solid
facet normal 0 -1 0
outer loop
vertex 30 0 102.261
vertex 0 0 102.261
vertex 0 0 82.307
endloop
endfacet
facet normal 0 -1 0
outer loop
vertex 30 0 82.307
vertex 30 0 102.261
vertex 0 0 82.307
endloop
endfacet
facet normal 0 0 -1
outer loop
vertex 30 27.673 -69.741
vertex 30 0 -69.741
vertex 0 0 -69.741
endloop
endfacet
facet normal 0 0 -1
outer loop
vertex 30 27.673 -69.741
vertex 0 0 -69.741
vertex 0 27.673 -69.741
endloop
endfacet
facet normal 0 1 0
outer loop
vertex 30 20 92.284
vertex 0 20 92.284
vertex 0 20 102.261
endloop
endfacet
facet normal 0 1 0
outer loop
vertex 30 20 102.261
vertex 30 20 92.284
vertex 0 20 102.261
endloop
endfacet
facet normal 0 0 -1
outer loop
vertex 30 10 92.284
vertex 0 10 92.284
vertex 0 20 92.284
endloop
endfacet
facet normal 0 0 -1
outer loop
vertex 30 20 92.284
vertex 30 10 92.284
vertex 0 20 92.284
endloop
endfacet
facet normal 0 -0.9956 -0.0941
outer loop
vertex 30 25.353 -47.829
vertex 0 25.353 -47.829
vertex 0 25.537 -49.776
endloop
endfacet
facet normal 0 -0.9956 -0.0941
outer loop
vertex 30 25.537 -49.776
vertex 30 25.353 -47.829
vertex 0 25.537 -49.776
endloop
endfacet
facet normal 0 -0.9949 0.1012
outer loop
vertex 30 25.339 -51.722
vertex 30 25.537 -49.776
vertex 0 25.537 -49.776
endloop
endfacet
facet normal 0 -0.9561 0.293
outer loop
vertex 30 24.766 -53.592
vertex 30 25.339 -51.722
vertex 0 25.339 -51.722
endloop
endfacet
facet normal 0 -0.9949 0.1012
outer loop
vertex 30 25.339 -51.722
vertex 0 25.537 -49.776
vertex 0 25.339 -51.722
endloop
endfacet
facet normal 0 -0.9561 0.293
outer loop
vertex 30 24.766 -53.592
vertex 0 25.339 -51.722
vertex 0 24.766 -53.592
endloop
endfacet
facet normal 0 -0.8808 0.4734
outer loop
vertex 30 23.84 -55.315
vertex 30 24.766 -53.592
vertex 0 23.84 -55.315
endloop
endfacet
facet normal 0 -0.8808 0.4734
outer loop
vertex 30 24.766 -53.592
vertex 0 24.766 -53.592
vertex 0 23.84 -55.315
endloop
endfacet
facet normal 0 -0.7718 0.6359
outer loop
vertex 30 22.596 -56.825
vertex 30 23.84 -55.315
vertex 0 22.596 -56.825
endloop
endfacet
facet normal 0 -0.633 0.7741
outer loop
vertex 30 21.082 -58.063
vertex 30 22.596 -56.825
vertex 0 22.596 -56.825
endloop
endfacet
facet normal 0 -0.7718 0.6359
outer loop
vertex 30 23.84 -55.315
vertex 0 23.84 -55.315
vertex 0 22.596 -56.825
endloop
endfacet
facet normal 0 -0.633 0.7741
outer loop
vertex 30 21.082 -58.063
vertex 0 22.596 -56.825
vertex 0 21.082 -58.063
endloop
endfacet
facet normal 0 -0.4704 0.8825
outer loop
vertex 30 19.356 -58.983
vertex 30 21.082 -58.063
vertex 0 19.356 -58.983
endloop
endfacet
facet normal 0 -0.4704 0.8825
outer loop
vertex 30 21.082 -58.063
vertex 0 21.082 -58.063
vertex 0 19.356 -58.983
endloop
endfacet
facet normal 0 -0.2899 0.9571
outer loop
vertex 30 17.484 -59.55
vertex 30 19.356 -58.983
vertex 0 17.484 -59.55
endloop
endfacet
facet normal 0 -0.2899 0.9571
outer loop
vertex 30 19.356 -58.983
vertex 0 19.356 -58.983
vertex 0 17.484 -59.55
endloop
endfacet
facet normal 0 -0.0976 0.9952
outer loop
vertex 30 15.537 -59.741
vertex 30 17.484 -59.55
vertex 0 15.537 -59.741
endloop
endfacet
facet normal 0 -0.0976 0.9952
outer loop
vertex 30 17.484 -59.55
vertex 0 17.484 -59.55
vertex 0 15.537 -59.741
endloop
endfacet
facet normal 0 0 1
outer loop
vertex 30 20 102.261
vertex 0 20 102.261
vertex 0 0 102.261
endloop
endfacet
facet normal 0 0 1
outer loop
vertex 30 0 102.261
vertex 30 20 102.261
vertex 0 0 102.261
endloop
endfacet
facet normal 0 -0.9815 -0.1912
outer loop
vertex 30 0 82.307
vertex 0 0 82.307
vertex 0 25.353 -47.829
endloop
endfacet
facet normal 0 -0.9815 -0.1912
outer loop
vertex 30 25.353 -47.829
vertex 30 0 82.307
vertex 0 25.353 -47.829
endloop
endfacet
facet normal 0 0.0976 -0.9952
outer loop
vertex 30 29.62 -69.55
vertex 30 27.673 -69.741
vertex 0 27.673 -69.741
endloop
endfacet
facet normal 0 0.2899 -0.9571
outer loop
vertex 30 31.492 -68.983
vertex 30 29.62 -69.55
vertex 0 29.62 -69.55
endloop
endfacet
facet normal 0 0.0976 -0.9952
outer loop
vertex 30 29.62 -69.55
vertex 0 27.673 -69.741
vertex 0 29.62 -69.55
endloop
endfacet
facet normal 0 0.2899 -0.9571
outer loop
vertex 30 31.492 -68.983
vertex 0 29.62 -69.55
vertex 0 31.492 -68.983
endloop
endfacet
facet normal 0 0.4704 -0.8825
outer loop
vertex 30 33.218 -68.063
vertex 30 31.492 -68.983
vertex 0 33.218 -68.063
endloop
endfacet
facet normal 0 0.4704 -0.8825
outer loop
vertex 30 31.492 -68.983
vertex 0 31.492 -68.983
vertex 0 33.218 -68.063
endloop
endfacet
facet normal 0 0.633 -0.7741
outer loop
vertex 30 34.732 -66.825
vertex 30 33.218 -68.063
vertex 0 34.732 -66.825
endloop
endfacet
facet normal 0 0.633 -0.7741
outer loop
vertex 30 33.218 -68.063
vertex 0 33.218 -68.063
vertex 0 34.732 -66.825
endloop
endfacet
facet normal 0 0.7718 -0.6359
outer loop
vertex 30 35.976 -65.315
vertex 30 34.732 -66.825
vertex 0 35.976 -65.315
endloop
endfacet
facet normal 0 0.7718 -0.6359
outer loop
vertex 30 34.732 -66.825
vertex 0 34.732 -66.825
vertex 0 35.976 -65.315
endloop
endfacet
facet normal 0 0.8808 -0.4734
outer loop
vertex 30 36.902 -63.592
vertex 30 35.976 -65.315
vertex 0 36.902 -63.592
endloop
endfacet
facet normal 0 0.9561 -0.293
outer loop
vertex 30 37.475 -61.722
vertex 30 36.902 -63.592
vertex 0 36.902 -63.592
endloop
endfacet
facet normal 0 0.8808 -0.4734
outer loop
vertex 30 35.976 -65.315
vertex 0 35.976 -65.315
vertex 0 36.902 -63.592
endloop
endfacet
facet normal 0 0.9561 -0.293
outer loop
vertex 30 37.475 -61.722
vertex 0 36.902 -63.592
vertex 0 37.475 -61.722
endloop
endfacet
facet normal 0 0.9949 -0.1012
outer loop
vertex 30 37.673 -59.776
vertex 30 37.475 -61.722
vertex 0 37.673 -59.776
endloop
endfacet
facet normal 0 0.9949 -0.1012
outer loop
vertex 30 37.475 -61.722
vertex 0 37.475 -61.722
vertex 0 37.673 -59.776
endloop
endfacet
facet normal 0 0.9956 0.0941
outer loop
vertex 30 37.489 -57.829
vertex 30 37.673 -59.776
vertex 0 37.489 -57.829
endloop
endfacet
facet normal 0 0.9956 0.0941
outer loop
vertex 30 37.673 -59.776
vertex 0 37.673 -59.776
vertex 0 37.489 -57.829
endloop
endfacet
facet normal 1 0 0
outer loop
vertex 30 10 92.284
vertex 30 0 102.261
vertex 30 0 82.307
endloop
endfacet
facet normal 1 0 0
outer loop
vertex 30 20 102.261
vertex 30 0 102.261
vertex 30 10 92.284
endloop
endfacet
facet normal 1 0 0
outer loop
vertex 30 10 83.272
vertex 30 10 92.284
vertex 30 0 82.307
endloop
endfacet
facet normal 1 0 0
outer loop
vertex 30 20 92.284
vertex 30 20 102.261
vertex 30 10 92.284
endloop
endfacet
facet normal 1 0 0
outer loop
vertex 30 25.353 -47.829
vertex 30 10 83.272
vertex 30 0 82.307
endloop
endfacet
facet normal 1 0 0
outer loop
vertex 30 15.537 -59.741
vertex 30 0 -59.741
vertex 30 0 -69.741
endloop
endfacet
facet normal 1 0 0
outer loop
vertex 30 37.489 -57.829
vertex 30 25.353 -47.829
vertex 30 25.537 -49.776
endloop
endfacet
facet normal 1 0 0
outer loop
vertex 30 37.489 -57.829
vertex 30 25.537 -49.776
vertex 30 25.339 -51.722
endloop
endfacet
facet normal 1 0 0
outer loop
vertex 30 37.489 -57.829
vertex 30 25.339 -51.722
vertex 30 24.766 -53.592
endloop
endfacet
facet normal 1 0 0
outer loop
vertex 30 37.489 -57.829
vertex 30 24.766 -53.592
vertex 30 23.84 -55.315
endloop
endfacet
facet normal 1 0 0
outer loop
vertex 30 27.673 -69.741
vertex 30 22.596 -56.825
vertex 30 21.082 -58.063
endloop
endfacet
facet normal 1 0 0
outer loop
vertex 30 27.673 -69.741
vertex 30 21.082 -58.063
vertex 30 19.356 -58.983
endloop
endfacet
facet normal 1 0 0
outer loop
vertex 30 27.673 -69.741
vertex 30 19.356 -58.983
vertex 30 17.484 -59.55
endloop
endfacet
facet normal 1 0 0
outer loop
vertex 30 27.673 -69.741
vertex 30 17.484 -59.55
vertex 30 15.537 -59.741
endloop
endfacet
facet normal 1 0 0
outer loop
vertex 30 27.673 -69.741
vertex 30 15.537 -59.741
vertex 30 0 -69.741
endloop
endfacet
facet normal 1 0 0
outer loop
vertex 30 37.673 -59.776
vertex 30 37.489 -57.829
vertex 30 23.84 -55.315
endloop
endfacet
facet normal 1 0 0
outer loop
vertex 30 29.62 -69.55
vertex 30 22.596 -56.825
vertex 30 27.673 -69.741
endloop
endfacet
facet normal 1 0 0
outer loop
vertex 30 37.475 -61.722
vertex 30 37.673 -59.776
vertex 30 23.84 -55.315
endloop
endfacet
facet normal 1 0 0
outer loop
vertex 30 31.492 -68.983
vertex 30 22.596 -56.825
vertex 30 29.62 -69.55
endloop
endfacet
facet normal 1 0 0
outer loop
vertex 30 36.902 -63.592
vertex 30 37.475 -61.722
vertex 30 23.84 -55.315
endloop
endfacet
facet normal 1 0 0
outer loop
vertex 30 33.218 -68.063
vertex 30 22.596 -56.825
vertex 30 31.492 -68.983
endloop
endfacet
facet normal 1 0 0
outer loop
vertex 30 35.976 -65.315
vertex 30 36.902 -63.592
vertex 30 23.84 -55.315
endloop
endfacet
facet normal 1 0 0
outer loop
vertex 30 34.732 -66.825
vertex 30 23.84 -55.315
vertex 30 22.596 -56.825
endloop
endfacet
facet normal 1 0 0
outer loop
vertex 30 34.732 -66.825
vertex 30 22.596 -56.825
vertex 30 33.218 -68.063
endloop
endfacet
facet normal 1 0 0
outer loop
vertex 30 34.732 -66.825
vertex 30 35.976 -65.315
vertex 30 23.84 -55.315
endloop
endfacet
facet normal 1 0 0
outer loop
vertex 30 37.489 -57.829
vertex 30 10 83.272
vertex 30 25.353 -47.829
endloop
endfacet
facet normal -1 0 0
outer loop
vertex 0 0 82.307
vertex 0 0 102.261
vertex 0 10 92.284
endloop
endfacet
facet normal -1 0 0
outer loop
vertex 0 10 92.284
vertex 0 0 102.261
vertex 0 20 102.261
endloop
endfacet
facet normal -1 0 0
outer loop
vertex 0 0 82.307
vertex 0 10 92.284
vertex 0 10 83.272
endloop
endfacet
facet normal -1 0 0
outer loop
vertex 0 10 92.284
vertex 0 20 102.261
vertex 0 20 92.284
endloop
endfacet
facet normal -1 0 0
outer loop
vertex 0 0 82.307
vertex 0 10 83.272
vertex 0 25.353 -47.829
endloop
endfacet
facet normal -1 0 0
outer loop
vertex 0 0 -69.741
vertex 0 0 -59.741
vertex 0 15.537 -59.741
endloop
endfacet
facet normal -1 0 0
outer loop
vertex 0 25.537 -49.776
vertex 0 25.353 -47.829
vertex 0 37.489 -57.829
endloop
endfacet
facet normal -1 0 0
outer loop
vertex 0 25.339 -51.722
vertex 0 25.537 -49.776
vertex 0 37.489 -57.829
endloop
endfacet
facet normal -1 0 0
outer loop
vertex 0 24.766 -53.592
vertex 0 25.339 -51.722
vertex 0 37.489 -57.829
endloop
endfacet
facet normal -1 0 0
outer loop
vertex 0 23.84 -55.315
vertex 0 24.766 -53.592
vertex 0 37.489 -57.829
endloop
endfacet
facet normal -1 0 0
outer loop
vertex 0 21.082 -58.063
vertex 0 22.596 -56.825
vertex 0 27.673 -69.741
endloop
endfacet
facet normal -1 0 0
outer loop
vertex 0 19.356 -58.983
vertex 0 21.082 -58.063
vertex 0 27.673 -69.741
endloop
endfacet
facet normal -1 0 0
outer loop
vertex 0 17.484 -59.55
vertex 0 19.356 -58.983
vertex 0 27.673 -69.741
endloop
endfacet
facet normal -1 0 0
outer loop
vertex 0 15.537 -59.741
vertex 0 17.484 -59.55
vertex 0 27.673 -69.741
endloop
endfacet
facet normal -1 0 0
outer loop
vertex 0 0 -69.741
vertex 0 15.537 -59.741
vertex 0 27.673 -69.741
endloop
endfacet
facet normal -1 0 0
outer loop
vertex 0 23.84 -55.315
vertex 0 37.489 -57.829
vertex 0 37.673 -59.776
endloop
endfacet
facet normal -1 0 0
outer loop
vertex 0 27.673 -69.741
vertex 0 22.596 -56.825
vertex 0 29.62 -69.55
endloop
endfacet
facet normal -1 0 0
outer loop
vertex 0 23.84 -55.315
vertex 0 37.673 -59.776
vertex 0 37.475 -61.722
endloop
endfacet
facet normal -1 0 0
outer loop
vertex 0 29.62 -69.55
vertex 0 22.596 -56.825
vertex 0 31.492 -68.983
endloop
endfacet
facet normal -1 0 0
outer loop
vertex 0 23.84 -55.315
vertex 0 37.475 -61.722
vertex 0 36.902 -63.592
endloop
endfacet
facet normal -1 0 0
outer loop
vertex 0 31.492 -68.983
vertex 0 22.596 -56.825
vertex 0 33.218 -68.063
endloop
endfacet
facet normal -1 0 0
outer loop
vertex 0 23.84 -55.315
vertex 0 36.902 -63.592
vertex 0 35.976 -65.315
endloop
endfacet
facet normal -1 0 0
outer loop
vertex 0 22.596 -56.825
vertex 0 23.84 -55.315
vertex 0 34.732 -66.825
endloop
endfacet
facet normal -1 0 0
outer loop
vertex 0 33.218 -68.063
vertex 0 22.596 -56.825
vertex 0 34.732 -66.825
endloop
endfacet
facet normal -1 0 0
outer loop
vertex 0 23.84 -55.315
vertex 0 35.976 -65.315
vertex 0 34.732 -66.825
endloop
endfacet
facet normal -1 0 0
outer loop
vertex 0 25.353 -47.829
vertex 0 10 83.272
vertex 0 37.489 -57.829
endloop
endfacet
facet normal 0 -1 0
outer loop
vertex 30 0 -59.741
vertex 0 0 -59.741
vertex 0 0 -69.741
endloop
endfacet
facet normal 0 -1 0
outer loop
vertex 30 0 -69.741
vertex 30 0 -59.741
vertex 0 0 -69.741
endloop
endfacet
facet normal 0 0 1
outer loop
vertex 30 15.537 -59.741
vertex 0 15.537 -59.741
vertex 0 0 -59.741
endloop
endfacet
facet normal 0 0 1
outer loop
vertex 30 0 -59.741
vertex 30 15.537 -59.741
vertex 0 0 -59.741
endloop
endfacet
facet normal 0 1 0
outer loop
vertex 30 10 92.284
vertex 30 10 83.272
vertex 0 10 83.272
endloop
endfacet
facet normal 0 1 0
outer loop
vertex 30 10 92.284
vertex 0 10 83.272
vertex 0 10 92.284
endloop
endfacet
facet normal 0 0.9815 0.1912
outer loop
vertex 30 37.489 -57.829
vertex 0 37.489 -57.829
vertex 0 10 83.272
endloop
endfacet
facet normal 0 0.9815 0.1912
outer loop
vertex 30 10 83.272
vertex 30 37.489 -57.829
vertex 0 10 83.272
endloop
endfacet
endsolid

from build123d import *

# Parameters (mm, degrees)
SALIENTE_EXTRUIR1_DEPTH = 30


with BuildPart() as part:
    # Croquis2 → Saliente-Extruir1 (new body)
    with BuildSketch(Plane(origin=(0, 0, 0), x_dir=(0, 0, -1), z_dir=(1, 0, 0))):
        with BuildLine():
            Line((-102.260641265, 0), (-82.307345408, 0))
            Line((-82.307345408, 0), (47.828906849, 25.352631084))
            ThreePointArc((47.828906849, 25.352631084), (56.100280199, 23.254742154), (59.741117951, 15.537161217))
            Line((59.741117951, 15.537161217), (59.741117951, 0))
            Line((59.741117951, 0), (69.741117951, 0))
            Line((69.741117951, 0), (69.741117951, 27.673321039))
            ThreePointArc((69.741117951, 27.673321039), (66.100280199, 35.390901976), (57.828906849, 37.488790906))
            Line((57.828906849, 37.488790906), (-83.272354624, 10))
            Line((-83.272354624, 10), (-92.283993337, 10))
            Line((-92.283993337, 10), (-92.283993337, 20))
            Line((-92.283993337, 20), (-102.260641265, 20))
            Line((-102.260641265, 20), (-102.260641265, 0))
        make_face()
    extrude(amount=SALIENTE_EXTRUIR1_DEPTH)


solid = part.part
